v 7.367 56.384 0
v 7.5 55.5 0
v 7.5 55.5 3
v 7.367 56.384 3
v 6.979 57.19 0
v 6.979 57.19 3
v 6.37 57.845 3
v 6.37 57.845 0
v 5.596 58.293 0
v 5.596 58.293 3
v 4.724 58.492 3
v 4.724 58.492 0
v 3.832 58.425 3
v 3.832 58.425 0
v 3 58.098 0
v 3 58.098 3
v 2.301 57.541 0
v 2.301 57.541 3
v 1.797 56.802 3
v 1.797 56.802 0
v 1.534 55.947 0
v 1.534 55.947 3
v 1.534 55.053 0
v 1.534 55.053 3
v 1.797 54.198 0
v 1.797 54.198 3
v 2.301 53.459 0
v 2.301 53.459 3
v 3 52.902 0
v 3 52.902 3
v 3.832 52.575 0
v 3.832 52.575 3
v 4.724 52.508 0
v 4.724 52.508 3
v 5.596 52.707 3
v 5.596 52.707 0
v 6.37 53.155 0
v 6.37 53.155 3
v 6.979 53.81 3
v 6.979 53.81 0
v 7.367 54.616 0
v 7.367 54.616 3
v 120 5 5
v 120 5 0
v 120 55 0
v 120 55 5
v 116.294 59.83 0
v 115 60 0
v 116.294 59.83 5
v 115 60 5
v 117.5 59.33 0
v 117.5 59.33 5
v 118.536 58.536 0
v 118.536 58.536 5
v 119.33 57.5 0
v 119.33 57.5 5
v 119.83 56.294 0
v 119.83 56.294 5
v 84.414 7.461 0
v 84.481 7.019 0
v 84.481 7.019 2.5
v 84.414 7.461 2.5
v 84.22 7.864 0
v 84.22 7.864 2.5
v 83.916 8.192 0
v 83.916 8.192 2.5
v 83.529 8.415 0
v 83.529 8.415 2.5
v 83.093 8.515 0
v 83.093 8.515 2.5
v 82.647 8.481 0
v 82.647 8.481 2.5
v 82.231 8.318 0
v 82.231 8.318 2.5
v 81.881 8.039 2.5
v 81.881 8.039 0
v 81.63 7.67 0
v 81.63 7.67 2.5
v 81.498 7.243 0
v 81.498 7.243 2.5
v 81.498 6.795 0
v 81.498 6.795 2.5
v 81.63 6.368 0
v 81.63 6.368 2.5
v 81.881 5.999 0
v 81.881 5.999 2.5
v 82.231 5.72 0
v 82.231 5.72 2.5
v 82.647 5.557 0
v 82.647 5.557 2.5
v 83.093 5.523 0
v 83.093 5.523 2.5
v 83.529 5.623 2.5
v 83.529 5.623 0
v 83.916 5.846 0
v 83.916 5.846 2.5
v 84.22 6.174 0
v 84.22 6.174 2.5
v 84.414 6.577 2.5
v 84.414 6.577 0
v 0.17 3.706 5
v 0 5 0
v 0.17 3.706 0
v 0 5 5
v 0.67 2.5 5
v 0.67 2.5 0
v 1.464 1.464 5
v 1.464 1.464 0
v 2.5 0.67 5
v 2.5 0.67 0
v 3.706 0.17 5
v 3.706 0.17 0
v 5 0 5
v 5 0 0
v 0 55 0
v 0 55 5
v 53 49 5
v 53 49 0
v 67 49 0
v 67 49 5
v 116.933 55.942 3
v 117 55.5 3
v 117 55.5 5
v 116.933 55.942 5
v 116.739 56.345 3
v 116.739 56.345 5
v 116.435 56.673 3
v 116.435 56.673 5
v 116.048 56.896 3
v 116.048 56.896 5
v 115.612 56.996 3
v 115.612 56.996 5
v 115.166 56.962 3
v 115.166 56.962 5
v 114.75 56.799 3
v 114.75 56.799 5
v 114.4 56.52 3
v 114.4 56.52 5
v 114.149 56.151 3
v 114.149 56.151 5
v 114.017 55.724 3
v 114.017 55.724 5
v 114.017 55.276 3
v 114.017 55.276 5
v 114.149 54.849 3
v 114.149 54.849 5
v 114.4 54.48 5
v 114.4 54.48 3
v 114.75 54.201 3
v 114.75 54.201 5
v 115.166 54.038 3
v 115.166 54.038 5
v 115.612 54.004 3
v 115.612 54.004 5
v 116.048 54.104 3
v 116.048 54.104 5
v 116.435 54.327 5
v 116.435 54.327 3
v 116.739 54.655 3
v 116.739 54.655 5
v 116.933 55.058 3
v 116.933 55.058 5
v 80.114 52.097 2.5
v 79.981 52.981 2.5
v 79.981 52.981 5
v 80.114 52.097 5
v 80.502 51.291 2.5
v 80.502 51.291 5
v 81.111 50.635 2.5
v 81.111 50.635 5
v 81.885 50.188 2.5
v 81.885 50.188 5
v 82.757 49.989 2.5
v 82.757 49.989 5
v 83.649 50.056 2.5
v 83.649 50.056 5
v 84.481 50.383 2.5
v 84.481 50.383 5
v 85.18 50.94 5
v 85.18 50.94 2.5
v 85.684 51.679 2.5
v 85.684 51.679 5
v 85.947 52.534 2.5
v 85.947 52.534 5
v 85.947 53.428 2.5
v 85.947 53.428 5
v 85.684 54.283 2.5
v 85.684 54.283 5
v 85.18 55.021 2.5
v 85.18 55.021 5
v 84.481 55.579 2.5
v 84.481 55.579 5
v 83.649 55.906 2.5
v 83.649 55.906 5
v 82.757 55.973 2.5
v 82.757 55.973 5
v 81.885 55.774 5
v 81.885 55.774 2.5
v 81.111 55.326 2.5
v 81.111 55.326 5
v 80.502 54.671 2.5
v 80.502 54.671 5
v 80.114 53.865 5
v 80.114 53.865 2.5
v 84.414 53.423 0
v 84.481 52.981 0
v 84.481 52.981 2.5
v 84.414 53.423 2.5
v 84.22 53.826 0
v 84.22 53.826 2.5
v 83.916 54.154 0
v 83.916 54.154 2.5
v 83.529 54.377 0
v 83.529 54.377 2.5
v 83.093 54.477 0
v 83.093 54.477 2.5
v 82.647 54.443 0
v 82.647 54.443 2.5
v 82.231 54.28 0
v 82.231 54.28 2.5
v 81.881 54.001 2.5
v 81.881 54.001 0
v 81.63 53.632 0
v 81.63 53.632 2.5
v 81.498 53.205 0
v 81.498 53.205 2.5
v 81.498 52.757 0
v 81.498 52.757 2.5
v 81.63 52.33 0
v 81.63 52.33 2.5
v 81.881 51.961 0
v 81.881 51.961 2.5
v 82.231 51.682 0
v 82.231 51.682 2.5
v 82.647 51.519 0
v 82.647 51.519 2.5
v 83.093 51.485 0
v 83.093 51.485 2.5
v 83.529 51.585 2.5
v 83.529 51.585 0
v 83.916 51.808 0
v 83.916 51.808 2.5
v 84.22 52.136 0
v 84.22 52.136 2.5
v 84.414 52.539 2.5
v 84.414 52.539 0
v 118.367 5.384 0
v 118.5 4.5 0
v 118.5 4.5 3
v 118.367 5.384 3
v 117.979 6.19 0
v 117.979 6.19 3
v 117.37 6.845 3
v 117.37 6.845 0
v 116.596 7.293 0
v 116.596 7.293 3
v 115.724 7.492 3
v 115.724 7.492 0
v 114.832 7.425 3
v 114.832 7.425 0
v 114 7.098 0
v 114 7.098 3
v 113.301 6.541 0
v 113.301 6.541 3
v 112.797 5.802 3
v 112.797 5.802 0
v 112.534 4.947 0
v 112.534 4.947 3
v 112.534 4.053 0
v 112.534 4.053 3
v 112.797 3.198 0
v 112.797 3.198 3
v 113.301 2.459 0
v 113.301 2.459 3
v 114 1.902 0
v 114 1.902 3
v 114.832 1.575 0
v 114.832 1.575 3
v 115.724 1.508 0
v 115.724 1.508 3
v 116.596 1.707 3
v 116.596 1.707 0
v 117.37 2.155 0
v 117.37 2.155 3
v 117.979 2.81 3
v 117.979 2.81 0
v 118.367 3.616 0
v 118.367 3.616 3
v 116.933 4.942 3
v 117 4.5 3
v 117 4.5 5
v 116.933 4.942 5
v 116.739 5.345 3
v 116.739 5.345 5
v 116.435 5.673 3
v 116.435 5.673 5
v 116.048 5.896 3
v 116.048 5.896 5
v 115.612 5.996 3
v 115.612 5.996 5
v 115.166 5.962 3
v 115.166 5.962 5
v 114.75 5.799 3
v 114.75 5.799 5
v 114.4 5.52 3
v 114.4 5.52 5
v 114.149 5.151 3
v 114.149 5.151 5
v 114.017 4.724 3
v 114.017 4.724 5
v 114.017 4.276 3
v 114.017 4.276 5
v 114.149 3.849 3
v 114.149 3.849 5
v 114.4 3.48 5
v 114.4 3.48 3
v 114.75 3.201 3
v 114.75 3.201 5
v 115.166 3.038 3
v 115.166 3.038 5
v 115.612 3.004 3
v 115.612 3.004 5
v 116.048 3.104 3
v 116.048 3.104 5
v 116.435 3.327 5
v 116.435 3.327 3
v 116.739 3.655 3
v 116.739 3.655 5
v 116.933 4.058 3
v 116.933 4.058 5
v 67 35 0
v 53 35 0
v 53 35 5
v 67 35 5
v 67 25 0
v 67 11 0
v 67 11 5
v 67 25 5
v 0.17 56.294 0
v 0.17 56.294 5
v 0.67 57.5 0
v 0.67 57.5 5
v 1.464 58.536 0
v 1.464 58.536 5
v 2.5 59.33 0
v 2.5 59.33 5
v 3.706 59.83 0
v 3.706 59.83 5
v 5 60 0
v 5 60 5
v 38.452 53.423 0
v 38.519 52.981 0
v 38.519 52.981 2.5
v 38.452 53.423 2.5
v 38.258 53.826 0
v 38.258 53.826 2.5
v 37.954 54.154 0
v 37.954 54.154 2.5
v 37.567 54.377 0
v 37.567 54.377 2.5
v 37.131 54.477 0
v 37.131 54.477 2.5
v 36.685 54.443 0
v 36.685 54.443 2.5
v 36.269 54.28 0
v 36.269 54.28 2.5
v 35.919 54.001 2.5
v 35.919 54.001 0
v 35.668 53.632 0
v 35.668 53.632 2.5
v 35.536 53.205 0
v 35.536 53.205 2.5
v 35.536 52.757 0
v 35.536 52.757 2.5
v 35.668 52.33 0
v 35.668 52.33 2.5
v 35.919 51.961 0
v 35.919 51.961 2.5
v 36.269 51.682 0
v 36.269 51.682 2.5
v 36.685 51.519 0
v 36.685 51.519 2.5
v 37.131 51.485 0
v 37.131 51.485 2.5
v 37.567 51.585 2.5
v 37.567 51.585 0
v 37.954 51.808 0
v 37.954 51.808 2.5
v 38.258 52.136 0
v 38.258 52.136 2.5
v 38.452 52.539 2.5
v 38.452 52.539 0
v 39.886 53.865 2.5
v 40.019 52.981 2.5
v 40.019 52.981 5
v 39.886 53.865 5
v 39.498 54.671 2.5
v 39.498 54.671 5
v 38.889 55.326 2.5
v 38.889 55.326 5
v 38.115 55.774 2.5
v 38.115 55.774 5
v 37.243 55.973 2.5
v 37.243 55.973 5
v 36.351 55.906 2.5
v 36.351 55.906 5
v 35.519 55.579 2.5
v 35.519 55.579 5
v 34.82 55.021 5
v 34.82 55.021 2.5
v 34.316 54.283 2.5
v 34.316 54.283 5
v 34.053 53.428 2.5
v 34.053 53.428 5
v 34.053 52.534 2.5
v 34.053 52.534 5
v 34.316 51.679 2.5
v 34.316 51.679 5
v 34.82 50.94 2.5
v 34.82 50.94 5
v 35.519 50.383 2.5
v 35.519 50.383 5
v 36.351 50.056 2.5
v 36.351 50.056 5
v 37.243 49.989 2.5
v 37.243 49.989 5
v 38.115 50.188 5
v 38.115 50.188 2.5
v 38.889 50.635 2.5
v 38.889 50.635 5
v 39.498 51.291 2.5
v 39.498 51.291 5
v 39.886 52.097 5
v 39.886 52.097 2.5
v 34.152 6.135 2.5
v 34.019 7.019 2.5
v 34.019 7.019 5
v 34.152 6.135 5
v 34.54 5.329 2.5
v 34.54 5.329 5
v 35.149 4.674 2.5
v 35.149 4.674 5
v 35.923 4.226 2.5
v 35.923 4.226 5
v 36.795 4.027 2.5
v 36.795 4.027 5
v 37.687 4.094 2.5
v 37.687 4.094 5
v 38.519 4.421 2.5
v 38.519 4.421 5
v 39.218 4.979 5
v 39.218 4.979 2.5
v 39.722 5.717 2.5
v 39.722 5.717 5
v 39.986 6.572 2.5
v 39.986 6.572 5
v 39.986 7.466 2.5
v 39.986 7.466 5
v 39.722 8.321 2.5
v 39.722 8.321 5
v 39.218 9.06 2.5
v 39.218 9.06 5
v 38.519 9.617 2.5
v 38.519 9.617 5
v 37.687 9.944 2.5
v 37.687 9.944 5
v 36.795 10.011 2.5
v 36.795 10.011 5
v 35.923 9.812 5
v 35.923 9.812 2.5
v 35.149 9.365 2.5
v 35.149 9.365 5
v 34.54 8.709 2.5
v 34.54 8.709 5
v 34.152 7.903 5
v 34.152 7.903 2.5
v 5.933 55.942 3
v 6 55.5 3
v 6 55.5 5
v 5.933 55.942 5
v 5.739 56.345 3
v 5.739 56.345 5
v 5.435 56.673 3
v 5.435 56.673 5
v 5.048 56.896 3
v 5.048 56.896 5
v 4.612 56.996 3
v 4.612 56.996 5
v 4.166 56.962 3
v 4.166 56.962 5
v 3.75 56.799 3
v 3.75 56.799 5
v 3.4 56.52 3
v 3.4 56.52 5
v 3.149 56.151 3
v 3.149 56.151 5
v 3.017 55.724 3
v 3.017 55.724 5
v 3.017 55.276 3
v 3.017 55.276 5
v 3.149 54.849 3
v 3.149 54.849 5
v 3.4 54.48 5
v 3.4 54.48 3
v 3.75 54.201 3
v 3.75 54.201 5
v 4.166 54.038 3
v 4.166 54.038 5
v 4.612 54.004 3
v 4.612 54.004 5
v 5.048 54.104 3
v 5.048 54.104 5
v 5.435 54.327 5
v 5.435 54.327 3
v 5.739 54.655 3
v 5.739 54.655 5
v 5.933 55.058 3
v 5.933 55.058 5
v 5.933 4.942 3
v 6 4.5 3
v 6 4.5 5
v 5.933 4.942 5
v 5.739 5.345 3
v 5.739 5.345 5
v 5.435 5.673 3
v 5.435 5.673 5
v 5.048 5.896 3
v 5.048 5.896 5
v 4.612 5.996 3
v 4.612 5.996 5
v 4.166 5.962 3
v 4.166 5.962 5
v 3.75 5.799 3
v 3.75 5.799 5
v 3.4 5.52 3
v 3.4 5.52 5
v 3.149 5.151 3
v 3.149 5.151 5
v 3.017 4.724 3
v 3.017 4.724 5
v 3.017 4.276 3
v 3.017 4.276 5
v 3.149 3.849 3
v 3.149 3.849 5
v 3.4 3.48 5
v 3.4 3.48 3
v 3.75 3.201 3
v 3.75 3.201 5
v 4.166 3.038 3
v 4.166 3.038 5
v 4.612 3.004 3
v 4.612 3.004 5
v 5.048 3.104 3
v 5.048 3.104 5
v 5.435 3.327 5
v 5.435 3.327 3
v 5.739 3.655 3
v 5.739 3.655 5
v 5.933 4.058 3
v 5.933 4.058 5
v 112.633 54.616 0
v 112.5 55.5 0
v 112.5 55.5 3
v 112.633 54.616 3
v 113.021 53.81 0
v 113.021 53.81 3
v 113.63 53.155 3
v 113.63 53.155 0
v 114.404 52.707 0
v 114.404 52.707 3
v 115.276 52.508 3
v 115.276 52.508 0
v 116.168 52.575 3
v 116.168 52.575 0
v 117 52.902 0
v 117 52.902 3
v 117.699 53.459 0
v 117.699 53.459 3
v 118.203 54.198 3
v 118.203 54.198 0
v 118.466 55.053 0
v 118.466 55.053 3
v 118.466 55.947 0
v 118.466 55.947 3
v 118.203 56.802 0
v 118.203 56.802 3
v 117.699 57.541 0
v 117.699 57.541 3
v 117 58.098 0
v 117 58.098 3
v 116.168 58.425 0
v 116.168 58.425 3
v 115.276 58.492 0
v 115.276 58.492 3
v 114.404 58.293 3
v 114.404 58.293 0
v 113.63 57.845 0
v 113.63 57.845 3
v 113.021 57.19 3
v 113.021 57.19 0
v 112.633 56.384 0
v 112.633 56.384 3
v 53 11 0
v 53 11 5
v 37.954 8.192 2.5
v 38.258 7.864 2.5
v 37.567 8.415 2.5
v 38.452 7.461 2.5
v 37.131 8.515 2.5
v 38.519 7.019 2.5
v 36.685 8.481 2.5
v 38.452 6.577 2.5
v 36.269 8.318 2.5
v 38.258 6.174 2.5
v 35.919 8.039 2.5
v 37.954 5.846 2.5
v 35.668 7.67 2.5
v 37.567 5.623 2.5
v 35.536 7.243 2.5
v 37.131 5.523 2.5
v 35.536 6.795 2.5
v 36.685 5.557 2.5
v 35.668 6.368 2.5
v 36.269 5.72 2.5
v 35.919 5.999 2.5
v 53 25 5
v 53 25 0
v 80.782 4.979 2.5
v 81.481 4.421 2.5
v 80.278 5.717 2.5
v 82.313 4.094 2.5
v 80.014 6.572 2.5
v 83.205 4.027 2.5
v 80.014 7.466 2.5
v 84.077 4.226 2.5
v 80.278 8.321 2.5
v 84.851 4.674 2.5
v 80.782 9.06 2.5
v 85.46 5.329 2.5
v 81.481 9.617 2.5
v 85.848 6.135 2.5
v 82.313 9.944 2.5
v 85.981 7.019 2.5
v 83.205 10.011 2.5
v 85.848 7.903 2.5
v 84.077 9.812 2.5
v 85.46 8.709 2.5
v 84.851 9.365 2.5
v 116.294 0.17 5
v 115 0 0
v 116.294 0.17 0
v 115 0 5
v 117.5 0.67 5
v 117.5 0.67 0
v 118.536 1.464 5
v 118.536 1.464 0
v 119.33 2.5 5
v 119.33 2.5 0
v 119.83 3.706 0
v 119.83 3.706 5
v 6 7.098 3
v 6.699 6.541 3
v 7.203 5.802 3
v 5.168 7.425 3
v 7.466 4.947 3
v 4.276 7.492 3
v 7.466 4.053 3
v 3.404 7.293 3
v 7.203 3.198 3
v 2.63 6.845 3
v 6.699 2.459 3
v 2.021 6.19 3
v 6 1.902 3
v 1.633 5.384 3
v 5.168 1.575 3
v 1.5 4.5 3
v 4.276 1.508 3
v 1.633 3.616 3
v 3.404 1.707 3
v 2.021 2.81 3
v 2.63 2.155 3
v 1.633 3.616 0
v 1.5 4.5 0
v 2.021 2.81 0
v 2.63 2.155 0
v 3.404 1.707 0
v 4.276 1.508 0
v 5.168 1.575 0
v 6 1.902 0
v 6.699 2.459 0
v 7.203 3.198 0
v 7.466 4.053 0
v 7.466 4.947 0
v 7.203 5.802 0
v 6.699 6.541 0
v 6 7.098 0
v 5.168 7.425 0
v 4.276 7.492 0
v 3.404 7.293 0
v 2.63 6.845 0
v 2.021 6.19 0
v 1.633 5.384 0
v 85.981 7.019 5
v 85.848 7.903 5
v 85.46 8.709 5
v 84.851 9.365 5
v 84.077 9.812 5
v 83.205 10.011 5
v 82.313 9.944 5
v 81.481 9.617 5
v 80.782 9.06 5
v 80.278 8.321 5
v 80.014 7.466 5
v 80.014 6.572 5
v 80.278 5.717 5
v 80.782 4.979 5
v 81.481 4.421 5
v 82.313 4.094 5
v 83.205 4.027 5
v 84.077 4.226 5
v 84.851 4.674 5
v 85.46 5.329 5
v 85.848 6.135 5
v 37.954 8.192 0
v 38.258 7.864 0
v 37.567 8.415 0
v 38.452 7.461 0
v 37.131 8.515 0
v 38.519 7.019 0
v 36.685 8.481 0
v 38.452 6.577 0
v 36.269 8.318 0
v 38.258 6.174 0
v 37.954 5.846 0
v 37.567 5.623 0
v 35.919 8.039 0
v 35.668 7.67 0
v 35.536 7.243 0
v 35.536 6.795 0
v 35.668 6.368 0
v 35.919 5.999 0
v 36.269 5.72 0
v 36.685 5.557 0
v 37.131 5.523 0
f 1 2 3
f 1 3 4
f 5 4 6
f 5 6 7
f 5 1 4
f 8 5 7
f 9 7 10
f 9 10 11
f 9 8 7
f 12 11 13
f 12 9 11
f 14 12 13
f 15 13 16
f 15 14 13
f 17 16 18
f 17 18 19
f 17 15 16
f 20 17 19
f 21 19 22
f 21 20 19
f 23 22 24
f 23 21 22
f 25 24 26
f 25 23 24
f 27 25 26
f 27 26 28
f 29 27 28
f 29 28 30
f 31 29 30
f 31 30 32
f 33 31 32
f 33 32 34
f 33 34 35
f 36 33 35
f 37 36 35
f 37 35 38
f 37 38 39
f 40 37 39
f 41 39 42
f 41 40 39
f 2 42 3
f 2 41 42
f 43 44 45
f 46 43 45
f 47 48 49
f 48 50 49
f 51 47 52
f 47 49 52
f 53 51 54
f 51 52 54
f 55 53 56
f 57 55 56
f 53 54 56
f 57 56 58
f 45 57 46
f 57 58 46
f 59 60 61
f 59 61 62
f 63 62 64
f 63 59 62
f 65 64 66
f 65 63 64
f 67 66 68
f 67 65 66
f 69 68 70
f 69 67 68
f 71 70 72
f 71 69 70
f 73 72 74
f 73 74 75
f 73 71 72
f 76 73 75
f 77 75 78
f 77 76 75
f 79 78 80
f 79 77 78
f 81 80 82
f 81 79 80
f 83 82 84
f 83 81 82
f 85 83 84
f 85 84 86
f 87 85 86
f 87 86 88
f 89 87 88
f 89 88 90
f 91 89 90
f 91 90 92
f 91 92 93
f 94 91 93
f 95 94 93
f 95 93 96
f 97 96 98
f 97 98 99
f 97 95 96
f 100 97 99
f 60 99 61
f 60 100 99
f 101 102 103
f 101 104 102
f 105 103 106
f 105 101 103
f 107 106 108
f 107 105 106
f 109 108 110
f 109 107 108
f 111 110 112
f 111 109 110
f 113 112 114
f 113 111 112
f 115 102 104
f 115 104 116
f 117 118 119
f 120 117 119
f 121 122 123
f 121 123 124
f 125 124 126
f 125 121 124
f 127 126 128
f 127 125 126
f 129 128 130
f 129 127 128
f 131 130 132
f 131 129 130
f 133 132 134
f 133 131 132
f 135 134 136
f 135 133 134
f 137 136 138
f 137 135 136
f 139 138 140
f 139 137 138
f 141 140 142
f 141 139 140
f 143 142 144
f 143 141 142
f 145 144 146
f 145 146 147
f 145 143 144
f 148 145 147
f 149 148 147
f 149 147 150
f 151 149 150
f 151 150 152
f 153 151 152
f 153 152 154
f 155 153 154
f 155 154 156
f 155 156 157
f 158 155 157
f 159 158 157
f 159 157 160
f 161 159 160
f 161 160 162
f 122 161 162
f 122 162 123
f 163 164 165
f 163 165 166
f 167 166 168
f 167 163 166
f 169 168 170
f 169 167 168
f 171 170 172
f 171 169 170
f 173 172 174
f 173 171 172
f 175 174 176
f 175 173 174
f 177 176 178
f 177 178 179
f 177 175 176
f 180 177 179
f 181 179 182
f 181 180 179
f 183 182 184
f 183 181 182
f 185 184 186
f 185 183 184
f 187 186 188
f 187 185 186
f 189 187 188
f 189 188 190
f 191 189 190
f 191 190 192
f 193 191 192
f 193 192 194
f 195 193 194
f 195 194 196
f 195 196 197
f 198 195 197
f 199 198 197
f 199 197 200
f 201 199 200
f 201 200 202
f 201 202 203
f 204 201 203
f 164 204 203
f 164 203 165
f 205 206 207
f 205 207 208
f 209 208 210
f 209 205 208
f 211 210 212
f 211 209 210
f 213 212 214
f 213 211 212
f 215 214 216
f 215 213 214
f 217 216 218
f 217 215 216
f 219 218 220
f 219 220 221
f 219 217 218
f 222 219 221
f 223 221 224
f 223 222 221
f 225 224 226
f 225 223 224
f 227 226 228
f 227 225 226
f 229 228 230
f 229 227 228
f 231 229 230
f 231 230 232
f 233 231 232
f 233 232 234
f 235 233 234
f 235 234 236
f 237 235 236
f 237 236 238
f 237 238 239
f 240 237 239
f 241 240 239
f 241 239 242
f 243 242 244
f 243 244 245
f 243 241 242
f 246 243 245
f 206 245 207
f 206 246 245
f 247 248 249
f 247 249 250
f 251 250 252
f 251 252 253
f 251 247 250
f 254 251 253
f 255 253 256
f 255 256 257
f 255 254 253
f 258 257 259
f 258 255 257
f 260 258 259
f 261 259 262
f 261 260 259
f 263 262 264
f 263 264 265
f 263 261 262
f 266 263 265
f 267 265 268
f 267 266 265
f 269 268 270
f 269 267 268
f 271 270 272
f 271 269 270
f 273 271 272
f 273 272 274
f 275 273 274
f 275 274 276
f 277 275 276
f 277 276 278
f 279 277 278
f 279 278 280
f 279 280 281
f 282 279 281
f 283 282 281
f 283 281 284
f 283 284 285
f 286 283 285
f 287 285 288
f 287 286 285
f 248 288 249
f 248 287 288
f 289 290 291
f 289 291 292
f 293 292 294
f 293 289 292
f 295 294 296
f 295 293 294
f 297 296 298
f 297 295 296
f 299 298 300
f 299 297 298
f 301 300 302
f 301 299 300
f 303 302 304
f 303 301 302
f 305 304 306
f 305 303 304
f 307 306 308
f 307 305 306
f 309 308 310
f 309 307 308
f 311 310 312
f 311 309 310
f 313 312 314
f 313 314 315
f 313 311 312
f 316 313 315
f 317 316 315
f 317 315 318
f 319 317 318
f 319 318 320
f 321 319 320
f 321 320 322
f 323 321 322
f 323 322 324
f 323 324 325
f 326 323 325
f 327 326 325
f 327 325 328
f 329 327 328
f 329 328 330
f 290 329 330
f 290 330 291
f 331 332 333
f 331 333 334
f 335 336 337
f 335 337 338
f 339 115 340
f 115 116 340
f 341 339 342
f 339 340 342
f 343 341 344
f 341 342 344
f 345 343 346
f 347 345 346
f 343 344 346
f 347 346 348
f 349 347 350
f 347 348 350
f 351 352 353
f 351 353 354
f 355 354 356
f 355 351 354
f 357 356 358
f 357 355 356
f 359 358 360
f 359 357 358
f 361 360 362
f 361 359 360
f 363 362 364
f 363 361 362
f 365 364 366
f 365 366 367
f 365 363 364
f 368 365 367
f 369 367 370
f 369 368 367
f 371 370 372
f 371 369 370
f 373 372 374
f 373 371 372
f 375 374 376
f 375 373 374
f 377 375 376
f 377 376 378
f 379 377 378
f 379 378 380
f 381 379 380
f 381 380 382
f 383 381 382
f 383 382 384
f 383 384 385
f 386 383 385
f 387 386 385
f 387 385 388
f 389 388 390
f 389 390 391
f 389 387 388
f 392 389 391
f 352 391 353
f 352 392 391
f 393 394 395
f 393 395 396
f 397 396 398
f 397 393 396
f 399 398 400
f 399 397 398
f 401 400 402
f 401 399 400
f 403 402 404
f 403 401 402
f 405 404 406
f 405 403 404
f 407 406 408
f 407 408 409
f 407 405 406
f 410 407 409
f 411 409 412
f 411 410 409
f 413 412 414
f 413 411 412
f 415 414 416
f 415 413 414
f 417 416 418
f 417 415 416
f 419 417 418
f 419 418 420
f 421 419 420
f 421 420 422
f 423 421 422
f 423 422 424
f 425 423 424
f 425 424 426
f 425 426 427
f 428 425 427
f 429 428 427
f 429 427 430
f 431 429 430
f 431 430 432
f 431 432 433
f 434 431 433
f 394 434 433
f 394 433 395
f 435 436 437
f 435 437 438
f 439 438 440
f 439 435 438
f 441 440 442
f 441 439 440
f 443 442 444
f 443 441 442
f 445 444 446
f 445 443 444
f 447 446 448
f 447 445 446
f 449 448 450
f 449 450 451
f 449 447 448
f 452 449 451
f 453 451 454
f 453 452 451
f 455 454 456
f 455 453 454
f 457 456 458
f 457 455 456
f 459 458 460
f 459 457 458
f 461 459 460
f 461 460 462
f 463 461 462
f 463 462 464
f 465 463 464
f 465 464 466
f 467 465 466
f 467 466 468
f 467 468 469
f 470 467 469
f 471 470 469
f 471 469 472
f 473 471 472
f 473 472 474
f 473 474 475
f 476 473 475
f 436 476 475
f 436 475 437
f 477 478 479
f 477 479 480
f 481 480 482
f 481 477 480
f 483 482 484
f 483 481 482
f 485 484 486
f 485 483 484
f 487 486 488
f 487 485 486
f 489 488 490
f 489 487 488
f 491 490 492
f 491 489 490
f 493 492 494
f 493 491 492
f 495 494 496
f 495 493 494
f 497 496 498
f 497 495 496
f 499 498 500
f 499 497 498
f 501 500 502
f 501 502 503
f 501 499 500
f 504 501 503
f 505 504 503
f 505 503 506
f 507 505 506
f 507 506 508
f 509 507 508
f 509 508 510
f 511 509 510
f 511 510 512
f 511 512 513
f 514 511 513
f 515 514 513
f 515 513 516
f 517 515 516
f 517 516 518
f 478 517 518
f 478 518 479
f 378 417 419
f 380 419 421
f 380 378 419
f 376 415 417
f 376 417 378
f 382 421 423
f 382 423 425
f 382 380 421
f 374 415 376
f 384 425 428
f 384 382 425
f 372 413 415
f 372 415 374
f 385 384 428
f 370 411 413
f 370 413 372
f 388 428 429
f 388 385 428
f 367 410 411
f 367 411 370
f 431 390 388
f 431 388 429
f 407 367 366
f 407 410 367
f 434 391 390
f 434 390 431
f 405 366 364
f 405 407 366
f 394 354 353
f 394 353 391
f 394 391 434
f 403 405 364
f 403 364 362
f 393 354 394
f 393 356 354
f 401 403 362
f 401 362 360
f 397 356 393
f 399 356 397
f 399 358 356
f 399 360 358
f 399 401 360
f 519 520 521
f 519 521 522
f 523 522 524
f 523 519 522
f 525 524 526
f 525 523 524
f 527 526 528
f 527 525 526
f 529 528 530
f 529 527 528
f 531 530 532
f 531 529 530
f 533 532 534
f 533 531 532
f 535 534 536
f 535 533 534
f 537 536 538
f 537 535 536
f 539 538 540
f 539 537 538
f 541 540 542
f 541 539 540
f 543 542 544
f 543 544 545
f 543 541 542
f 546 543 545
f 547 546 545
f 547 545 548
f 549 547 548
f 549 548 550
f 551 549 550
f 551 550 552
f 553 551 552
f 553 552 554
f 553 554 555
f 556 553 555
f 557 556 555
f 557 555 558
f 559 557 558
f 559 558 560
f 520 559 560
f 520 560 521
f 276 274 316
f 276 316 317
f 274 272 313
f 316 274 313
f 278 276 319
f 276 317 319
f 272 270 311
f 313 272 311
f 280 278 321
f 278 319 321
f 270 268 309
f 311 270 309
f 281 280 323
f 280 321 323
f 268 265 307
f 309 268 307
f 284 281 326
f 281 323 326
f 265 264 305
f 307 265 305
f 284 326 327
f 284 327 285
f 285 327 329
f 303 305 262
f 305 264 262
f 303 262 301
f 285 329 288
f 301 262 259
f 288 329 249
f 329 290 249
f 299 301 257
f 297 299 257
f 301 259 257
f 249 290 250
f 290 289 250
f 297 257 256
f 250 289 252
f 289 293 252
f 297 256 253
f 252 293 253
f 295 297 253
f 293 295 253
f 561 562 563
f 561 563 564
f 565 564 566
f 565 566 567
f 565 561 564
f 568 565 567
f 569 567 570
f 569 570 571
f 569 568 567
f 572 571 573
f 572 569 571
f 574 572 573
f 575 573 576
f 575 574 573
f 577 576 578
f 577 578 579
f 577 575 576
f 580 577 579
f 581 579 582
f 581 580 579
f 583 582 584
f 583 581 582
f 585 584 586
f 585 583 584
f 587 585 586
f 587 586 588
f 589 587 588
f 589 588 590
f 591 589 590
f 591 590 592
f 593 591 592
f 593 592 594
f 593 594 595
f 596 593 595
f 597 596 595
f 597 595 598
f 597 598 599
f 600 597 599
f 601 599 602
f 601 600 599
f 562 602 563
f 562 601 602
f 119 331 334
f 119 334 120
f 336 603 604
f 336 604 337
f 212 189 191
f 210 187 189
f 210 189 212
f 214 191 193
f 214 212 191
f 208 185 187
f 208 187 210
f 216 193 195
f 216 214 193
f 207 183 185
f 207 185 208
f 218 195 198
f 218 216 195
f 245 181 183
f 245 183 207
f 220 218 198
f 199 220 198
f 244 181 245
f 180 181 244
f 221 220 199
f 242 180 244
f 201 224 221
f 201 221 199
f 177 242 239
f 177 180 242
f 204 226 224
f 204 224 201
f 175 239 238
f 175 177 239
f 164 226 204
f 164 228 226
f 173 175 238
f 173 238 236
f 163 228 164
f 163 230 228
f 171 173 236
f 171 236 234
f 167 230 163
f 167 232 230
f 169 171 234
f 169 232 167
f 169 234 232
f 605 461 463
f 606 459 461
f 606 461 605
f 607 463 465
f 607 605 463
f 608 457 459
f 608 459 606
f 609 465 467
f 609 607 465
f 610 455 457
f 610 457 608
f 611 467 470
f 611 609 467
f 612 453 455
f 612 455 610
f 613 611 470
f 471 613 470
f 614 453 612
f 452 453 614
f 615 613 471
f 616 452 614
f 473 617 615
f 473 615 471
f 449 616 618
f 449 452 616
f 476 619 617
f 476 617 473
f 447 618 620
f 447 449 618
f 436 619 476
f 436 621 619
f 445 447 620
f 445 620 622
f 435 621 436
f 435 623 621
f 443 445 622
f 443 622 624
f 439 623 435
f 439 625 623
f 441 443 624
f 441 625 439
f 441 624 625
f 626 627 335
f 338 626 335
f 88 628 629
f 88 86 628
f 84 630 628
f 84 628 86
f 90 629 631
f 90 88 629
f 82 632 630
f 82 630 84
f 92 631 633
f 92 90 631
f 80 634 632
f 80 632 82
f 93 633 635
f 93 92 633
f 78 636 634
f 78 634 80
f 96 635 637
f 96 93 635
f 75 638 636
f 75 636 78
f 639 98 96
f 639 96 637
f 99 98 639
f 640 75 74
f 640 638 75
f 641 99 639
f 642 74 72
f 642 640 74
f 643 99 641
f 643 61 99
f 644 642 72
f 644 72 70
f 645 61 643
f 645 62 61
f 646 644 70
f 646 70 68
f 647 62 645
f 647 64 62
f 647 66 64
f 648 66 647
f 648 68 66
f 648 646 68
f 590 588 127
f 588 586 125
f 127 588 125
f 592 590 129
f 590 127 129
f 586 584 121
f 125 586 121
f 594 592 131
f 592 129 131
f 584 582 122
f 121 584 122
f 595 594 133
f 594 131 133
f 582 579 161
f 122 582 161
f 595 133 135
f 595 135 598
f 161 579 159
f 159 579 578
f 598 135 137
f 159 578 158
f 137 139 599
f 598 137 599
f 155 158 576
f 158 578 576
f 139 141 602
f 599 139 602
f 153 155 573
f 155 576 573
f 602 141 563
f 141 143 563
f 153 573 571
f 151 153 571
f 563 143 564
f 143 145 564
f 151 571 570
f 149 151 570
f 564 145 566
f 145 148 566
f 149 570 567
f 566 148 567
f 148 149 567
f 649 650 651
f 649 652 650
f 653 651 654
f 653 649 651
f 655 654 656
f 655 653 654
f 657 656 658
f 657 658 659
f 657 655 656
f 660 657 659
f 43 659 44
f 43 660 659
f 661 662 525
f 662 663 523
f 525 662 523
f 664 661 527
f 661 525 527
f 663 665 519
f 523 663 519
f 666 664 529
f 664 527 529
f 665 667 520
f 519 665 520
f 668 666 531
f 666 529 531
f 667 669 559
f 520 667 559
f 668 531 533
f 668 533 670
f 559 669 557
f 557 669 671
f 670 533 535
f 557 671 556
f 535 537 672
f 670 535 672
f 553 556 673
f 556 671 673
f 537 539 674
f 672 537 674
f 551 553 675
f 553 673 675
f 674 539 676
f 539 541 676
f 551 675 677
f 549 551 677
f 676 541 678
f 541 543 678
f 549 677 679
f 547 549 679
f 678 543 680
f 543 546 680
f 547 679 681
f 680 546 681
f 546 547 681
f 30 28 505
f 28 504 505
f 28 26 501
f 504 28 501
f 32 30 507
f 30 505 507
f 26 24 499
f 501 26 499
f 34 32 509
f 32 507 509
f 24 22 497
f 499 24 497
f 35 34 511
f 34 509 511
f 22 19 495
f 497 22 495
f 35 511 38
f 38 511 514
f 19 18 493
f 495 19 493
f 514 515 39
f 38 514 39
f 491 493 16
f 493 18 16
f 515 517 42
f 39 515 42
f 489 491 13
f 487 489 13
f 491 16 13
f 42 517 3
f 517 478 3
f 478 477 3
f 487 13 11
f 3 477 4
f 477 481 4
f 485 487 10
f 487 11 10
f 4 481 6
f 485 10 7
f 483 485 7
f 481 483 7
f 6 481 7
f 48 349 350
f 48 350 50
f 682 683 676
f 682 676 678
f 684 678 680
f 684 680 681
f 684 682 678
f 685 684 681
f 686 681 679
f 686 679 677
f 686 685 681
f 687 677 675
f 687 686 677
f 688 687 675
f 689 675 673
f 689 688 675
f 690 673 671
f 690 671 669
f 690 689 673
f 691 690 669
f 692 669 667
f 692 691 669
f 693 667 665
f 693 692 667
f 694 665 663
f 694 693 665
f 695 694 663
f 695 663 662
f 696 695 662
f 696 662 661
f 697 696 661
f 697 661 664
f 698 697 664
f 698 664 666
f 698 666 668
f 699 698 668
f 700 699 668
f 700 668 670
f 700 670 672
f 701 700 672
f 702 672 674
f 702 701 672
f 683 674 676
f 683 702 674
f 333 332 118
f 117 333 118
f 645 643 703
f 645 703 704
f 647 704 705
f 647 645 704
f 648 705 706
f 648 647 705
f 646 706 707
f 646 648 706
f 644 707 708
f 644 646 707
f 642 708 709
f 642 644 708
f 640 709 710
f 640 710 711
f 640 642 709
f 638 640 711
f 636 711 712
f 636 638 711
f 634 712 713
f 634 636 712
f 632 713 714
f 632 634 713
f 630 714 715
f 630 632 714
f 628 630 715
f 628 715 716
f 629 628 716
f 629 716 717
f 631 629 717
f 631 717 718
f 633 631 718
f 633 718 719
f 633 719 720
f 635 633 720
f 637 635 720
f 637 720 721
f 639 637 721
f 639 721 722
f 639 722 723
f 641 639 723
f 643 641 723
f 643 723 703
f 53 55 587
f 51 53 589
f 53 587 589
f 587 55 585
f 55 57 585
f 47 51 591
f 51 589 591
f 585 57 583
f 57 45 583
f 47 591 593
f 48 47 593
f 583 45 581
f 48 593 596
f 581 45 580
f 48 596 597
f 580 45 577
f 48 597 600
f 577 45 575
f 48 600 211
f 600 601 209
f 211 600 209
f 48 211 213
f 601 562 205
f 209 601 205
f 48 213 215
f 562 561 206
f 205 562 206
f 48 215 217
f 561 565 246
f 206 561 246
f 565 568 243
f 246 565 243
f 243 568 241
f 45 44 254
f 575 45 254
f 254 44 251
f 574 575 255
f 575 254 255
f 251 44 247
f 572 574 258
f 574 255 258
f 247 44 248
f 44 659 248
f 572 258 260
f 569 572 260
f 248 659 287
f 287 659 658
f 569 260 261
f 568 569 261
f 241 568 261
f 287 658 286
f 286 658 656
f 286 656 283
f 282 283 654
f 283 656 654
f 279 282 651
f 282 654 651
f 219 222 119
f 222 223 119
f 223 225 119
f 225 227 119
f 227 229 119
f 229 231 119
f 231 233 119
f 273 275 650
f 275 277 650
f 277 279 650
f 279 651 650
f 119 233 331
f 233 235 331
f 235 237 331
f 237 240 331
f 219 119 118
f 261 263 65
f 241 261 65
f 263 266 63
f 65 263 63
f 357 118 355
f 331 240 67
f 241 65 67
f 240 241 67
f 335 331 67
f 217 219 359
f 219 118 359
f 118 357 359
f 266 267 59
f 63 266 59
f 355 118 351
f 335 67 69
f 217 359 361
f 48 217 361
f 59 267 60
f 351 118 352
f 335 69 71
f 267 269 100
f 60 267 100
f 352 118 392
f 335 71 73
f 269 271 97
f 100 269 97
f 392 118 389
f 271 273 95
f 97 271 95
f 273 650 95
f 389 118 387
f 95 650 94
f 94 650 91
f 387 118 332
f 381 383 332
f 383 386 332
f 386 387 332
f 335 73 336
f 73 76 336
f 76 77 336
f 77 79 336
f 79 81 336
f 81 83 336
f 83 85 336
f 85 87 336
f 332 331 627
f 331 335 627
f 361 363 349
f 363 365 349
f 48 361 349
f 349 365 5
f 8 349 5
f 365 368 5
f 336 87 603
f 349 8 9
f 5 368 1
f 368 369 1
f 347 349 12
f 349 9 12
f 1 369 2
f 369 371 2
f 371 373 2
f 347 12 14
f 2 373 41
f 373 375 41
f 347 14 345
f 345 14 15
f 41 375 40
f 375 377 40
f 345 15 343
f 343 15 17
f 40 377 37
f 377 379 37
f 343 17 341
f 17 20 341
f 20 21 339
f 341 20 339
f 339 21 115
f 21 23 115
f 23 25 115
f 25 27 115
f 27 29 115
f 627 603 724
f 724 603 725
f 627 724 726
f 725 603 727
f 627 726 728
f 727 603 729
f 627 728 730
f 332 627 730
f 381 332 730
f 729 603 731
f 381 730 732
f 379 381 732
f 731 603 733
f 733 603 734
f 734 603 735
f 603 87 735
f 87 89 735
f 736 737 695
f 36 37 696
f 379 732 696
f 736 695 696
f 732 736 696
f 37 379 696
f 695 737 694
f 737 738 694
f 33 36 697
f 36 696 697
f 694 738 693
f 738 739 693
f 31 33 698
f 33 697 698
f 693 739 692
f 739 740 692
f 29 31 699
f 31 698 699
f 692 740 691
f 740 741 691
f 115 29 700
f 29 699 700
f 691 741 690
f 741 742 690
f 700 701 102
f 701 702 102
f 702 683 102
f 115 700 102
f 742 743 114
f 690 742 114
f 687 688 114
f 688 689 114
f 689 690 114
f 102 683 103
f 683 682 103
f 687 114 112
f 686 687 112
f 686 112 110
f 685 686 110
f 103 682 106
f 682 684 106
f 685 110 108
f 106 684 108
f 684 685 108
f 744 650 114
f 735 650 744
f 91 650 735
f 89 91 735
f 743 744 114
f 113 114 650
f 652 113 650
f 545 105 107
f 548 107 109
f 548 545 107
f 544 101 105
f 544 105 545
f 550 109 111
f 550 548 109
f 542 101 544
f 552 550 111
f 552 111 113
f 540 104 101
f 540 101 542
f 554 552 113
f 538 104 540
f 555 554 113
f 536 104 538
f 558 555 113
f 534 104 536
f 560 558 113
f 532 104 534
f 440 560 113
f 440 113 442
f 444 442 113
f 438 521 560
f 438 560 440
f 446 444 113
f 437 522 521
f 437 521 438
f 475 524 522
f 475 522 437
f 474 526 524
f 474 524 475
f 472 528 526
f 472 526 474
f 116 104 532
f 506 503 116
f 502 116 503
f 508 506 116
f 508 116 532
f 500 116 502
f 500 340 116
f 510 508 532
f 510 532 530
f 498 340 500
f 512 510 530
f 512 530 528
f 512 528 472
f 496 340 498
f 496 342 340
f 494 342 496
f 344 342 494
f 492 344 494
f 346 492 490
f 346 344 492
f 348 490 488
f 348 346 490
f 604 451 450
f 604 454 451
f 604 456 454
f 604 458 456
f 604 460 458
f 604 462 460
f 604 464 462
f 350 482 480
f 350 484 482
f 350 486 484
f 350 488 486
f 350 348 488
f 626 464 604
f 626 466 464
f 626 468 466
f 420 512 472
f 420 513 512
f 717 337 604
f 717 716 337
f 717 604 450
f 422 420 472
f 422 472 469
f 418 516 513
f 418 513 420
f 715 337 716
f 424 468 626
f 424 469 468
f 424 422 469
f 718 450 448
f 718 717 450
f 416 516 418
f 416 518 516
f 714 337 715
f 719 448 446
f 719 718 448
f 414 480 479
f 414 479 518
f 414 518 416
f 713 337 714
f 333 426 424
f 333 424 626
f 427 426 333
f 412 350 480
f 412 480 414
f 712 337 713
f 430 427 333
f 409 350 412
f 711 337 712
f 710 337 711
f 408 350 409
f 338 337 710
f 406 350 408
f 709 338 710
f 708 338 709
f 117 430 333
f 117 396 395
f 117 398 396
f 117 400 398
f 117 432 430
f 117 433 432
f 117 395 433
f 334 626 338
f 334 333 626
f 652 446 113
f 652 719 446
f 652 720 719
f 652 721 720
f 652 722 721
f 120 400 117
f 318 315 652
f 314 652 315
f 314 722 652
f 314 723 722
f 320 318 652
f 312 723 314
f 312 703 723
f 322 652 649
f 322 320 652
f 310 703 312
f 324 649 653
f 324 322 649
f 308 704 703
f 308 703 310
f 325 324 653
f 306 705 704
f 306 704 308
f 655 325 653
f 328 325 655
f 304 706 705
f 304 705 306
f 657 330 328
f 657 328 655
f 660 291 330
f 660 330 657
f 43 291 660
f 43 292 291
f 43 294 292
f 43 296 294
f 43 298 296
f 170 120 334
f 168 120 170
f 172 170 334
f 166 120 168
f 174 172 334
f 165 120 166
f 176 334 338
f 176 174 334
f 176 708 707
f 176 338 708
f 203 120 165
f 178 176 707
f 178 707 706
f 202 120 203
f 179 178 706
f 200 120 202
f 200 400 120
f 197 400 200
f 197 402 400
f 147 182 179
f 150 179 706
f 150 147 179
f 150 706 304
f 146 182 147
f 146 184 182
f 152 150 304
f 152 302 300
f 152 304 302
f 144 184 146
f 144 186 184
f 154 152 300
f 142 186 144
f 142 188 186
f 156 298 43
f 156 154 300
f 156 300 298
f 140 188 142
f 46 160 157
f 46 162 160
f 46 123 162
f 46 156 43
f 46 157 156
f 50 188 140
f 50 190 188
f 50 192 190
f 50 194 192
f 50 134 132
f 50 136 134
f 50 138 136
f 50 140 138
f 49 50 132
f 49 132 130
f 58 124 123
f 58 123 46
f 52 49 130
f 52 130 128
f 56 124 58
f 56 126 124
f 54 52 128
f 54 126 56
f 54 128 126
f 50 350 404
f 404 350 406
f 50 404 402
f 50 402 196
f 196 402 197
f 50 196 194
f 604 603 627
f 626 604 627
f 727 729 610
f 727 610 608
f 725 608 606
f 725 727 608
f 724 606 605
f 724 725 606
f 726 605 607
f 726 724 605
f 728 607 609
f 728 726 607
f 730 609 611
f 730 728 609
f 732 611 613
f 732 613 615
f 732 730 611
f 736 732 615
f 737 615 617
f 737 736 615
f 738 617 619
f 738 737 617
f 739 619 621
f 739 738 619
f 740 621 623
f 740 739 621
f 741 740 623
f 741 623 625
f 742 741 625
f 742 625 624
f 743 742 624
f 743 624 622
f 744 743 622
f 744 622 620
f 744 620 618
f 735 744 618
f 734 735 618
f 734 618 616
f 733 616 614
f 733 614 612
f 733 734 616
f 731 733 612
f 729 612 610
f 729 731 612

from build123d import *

# Parameters (mm, degrees)
SKETCH1_W           = 120
SKETCH1_H           = 60
BOSS_EXTRUDE1_DEPTH = 5
SKETCH1_6_R         = 1.5
CUT_EXTRUDE1_DEPTH  = 5
SKETCH1_7_R         = 3
CUT_EXTRUDE2_DEPTH  = 3
SKETCH1_12_R        = 3
CUT_EXTRUDE4_DEPTH  = 5
SKETCH1_13_R        = 3
SKETCH1_13_R_2      = 1.5
BOSS_EXTRUDE2_DEPTH = 2.5
FILLET1_R           = 5
SKETCH3_W           = 14
SKETCH3_H           = 14
CUT_EXTRUDE8_DEPTH  = 10


with BuildPart() as part:
    # Sketch1 → Boss-Extrude1 (new body)
    with BuildSketch(Plane.XY):
        with Locations((60, 30)):
            Rectangle(SKETCH1_W, SKETCH1_H)
    extrude(amount=BOSS_EXTRUDE1_DEPTH)

    # Sketch1<6> → Cut-Extrude1 (cut)
    with BuildSketch(Plane.XY):
        with Locations((4.5, 55.5)):
            Circle(SKETCH1_6_R)
        with Locations((115.5, 55.5)):
            Circle(SKETCH1_6_R)
        with Locations((4.5, 4.5)):
            Circle(SKETCH1_6_R)
        with Locations((115.5, 4.5)):
            Circle(SKETCH1_6_R)
    extrude(amount=CUT_EXTRUDE1_DEPTH, mode=Mode.SUBTRACT)

    # Sketch1<7> → Cut-Extrude2 (cut)
    with BuildSketch(Plane.XY):
        with Locations((4.5, 55.5)):
            Circle(SKETCH1_7_R)
        with Locations((115.5, 55.5)):
            Circle(SKETCH1_7_R)
        with Locations((4.5, 4.5)):
            Circle(SKETCH1_7_R)
        with Locations((115.5, 4.5)):
            Circle(SKETCH1_7_R)
    extrude(amount=CUT_EXTRUDE2_DEPTH, mode=Mode.SUBTRACT)

    # Sketch1<12> → Cut-Extrude4 (cut)
    with BuildSketch(Plane.XY):
        with Locations((37.019029611, 52.980970389)):
            Circle(SKETCH1_12_R)
        with Locations((82.980970389, 52.980970389)):
            Circle(SKETCH1_12_R)
        with Locations((37.019029611, 7.019029611)):
            Circle(SKETCH1_12_R)
        with Locations((82.980970389, 7.019029611)):
            Circle(SKETCH1_12_R)
    extrude(amount=CUT_EXTRUDE4_DEPTH, mode=Mode.SUBTRACT)

    # Sketch1<13> → Boss-Extrude2 (add)
    # profile 1 of 4: a face of its own
    with BuildSketch(Plane.XY):
        with Locations((82.980970389, 52.980970389)):
            Circle(SKETCH1_13_R)
        with Locations((82.980970389, 52.980970389)):
            Circle(SKETCH1_13_R_2, mode=Mode.SUBTRACT)
    # profile 2 of 4: a face of its own
    with BuildSketch(Plane.XY):
        with Locations((82.980970389, 7.019029611)):
            Circle(SKETCH1_13_R)
        with Locations((82.980970389, 7.019029611)):
            Circle(SKETCH1_13_R_2, mode=Mode.SUBTRACT)
    # profile 3 of 4: a face of its own
    with BuildSketch(Plane.XY):
        with Locations((37.019029611, 52.980970389)):
            Circle(SKETCH1_13_R)
        with Locations((37.019029611, 52.980970389)):
            Circle(SKETCH1_13_R_2, mode=Mode.SUBTRACT)
    # profile 4 of 4: a face of its own
    with BuildSketch(Plane.XY):
        with Locations((37.019029611, 7.019029611)):
            Circle(SKETCH1_13_R)
        with Locations((37.019029611, 7.019029611)):
            Circle(SKETCH1_13_R_2, mode=Mode.SUBTRACT)
    extrude(amount=BOSS_EXTRUDE2_DEPTH)

    # Fillet1
    fillet1_edges = [part.edges().sort_by_distance(p)[0] for p in [
        (0, 60, 2.5),
        (0, 0, 2.5),
        (120, 0, 2.5),
        (120, 60, 2.5),
    ]]
    fillet(fillet1_edges, radius=FILLET1_R)

    # Sketch3 → Cut-Extrude8 (cut)
    with BuildSketch(Plane.XY):
        with Locations((60, 18)):
            Rectangle(SKETCH3_W, SKETCH3_H)
        with Locations((60, 42)):
            Rectangle(SKETCH3_W, SKETCH3_H)
    extrude(amount=CUT_EXTRUDE8_DEPTH, mode=Mode.SUBTRACT)


solid = part.part
